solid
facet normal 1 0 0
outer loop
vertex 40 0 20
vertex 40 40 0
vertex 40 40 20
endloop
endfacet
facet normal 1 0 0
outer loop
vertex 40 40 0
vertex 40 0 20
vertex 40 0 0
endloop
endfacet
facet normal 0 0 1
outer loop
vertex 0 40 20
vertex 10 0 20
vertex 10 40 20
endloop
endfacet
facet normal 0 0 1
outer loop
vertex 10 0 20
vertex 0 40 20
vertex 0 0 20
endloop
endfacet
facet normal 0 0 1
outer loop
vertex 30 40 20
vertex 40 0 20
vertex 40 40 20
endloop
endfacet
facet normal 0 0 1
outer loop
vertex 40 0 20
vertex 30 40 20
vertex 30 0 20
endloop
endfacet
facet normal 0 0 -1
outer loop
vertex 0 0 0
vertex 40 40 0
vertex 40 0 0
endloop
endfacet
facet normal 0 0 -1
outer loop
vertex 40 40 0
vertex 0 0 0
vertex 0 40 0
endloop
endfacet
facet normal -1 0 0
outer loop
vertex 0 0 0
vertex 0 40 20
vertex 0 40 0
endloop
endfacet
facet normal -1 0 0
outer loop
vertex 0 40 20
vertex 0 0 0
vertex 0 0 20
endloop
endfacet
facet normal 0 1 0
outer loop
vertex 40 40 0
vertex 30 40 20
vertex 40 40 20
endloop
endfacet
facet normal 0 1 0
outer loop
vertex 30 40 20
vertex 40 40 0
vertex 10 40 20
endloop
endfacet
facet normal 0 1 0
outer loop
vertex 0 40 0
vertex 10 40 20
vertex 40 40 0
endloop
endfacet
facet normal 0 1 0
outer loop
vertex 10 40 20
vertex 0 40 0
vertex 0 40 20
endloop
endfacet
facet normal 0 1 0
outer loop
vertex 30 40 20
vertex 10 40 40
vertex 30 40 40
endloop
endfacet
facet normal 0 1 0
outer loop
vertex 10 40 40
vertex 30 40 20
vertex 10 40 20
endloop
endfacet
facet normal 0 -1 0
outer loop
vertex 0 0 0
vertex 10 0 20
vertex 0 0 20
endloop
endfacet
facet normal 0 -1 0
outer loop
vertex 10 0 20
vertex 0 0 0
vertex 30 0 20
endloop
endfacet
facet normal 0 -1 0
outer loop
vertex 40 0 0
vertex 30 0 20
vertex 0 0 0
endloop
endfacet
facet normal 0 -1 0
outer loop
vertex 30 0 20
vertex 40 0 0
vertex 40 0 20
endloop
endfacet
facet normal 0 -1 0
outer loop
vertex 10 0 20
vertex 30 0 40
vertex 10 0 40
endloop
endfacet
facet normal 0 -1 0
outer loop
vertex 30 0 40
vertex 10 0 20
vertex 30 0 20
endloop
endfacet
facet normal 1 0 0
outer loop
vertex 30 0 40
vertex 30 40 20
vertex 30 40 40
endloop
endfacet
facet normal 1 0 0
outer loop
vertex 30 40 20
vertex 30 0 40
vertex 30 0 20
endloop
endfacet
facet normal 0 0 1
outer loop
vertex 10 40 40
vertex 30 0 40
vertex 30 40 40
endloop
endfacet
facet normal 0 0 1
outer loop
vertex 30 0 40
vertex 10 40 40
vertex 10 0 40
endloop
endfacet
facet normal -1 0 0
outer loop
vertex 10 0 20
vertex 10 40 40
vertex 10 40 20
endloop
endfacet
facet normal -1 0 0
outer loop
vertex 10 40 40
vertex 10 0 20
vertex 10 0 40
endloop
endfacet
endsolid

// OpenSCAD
union(){
cube([40,40,20]);
translate([10,0,20])
cube([20,40,20]);
}
